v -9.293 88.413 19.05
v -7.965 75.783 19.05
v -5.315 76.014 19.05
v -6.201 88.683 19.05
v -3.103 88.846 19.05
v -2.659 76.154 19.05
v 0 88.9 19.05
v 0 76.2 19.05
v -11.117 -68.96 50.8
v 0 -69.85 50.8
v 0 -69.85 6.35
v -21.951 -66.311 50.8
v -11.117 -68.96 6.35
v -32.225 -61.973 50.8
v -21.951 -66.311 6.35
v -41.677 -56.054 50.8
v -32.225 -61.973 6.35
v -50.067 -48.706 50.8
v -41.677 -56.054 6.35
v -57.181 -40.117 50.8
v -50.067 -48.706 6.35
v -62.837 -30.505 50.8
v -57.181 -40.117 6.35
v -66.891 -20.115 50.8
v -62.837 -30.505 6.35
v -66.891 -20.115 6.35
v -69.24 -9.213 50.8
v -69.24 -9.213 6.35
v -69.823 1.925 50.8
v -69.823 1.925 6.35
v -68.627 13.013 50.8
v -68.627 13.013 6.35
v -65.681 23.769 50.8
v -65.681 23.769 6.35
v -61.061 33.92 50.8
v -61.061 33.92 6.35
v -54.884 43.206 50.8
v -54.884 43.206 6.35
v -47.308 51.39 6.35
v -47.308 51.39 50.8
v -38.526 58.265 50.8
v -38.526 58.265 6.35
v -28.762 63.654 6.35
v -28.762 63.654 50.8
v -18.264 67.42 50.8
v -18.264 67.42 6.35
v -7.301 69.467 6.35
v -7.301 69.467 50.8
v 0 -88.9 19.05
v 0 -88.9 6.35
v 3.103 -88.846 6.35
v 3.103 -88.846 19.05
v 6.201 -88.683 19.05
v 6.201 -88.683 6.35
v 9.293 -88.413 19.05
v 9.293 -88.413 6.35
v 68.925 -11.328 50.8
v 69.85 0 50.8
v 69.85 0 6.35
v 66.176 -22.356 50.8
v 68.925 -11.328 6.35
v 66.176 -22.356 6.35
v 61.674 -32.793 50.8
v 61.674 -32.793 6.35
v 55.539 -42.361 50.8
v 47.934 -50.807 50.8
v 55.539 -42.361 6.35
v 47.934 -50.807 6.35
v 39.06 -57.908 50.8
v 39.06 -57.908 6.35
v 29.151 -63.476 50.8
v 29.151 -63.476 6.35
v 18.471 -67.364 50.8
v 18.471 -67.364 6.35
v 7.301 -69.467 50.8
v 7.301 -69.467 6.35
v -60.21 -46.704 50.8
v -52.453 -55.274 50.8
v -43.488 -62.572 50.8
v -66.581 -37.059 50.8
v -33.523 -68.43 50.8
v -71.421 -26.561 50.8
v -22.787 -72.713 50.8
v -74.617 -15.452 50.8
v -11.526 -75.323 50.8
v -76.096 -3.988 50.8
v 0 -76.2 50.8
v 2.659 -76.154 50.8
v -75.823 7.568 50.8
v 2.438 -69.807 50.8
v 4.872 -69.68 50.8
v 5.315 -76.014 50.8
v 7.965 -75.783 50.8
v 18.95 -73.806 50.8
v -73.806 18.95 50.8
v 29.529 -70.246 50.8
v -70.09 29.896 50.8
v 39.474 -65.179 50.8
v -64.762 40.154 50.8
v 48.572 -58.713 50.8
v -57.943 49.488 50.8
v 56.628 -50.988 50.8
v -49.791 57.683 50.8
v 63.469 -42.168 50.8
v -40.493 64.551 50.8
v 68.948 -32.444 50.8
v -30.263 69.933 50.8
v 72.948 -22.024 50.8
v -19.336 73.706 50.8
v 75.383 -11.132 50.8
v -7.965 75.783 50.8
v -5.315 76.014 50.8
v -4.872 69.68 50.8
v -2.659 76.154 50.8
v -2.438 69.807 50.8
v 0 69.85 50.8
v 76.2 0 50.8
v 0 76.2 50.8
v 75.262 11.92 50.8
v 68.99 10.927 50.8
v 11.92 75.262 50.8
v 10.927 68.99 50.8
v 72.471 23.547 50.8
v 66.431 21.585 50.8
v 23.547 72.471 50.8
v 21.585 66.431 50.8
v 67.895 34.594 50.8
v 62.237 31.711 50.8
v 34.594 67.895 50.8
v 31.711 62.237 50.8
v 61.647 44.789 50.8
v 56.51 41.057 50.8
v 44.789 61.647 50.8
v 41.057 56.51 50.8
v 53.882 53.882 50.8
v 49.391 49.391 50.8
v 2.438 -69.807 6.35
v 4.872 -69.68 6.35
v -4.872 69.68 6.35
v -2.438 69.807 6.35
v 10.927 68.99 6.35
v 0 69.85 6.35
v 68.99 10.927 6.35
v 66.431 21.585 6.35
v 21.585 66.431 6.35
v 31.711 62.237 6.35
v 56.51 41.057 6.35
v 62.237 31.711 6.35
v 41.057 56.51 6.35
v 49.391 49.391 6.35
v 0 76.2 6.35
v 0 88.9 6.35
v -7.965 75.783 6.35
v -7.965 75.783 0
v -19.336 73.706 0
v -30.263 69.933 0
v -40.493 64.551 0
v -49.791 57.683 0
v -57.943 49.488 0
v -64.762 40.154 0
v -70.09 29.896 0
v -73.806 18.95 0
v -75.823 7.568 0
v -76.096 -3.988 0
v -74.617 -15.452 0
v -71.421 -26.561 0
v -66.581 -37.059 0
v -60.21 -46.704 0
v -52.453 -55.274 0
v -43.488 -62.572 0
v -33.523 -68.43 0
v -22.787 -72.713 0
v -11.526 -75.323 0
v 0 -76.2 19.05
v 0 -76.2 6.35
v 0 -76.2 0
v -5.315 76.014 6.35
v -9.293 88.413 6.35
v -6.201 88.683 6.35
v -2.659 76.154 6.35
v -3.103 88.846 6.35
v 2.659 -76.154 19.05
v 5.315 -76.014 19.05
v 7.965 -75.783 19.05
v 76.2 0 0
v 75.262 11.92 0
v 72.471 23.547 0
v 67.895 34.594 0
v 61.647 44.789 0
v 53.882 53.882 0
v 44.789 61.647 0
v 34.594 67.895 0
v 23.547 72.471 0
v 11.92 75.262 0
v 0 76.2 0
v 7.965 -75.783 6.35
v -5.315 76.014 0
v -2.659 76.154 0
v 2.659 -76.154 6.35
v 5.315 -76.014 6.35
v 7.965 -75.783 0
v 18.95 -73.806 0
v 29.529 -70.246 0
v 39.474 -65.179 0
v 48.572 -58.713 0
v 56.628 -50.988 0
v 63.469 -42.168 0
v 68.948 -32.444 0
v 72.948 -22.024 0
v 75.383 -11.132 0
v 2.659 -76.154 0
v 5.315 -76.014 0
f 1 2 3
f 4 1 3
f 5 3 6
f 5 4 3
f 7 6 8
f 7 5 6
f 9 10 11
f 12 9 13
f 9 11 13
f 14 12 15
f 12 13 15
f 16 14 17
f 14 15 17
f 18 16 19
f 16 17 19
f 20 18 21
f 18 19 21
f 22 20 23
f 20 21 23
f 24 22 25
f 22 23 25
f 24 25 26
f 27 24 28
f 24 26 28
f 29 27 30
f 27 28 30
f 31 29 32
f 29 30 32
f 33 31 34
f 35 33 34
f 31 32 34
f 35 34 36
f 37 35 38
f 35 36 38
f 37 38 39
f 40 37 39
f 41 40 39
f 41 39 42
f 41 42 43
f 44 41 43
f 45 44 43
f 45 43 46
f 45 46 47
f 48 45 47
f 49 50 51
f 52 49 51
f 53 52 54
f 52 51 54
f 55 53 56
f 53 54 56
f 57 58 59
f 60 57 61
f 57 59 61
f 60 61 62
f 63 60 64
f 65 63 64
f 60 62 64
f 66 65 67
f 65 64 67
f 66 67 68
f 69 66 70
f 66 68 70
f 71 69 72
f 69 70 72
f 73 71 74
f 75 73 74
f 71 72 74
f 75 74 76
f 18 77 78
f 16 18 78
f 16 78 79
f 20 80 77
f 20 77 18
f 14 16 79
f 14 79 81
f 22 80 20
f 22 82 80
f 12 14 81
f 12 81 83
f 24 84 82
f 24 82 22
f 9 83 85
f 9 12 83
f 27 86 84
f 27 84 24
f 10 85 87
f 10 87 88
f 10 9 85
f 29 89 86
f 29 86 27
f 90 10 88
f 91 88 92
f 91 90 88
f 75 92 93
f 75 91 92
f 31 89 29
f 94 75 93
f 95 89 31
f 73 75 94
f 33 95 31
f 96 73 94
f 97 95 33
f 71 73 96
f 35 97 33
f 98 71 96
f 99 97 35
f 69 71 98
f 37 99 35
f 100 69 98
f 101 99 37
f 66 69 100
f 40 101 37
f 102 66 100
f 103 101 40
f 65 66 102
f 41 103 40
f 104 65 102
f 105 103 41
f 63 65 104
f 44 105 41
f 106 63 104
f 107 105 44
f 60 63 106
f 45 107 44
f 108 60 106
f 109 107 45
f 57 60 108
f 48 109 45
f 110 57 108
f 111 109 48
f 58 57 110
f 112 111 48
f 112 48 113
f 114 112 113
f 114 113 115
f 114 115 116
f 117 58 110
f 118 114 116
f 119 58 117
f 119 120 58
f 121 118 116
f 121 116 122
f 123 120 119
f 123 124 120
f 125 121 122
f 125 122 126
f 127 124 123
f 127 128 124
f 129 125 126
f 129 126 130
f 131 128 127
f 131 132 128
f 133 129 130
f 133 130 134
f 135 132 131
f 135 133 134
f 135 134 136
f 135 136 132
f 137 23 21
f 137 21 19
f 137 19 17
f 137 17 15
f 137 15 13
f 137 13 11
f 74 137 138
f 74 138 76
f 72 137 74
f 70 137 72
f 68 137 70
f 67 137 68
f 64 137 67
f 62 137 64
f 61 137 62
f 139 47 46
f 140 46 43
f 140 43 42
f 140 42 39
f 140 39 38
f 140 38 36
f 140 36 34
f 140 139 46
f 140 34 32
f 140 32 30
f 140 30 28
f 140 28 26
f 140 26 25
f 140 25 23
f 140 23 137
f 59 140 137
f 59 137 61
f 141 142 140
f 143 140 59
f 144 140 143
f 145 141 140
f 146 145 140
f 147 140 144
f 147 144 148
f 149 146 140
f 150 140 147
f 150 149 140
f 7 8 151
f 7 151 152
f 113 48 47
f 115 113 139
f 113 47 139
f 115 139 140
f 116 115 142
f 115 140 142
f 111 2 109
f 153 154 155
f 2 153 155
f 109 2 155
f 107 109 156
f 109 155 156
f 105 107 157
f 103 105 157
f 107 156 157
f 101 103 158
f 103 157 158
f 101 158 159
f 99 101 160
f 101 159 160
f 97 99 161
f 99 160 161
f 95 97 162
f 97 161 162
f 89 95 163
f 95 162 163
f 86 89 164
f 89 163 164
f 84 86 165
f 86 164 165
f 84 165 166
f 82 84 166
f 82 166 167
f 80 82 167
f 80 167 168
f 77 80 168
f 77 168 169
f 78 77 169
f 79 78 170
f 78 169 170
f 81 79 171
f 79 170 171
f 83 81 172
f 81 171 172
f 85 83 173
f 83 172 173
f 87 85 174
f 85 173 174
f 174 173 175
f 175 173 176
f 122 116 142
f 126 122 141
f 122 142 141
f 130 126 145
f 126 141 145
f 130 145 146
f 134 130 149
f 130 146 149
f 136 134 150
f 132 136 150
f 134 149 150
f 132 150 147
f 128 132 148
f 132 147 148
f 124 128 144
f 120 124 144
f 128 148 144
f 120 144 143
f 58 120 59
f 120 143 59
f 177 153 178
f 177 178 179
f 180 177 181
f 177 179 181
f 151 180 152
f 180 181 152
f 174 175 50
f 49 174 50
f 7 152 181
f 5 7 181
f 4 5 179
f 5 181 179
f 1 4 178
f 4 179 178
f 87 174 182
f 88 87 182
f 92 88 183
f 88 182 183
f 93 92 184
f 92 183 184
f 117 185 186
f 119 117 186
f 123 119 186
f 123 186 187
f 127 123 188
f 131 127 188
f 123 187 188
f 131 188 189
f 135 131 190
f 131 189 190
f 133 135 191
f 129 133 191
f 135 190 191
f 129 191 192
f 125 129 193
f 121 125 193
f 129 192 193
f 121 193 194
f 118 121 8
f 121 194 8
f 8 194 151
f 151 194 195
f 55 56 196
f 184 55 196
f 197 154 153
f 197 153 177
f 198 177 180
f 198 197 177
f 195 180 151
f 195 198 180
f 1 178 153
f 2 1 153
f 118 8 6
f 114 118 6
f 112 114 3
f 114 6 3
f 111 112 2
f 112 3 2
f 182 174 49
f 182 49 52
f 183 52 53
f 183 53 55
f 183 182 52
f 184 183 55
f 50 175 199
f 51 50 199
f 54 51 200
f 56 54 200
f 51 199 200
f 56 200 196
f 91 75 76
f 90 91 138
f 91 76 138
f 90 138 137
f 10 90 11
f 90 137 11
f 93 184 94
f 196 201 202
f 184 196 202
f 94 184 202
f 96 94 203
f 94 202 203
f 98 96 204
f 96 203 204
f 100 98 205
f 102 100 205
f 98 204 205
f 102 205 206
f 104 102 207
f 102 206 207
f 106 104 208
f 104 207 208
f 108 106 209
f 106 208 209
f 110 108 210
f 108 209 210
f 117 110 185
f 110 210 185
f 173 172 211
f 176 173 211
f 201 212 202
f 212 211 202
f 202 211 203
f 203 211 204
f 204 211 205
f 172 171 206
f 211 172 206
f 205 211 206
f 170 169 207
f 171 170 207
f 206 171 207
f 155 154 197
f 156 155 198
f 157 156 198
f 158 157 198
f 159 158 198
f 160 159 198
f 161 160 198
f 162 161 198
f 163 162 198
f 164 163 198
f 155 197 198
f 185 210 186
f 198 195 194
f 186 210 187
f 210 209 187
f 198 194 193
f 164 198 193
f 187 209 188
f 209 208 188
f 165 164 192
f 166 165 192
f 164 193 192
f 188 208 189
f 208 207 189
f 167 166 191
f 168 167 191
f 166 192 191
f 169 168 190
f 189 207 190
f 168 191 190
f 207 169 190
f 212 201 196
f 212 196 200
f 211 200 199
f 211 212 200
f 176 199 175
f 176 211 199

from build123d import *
from build123d import SkipClean  # not in build123d's __all__

# Parameters (mm, degrees)
F1_DEPTH = 50.8
F2_DEPTH = 19.05
F3_DEPTH = 6.35
F4_DEPTH = 6.35


# Not quite as in the source:
# - after a boolean that leaves OpenCascade's solid faulty, fix() repairs it


with BuildPart() as f1:
    # F0 (on Top) → F1 (new body)
    with BuildSketch(Plane.XY):
        with BuildLine():
            Line((-7.3013131592, 69.4673543915), (-7.965068901, 75.7825684271))
            ThreePointArc((-7.965068901, 75.7825684271), (-76.0955705483, -3.9879998657), (0, -76.2))
            Line((0, -76.2), (0, -69.85))
            ThreePointArc((0, -69.85), (-69.7542730026, -3.6556665436), (-7.3013131592, 69.4673543915))
        make_face()
        with BuildLine():
            Line((0, 69.85), (0, 76.2))
            ThreePointArc((0, 76.2), (-3.9879998657, 76.0955705483), (-7.965068901, 75.7825684271))
            Line((-7.965068901, 75.7825684271), (-7.3013131592, 69.4673543915))
            ThreePointArc((-7.3013131592, 69.4673543915), (-3.6556665436, 69.7542730026), (0, 69.85))
        make_face()
        with BuildLine():
            ThreePointArc((0, -76.2), (3.9879998657, -76.0955705483), (7.965068901, -75.7825684271))
            Line((7.965068901, -75.7825684271), (7.3013131592, -69.4673543915))
            ThreePointArc((7.3013131592, -69.4673543915), (3.6556665436, -69.7542730026), (0, -69.85))
            Line((0, -69.85), (0, -76.2))
        make_face()
        with BuildLine():
            ThreePointArc((7.965068901, -75.7825684271), (56.6276357014, -50.9877522045), (76.2, 0))
            ThreePointArc((76.2, 0), (53.8815367264, 53.8815367264), (0, 76.2))
            Line((0, 76.2), (0, 69.85))
            ThreePointArc((0, 69.85), (49.3914086659, 49.3914086659), (69.85, 0))
            ThreePointArc((69.85, 0), (51.9086660596, -46.7387728542), (7.3013131592, -69.4673543915))
            Line((7.3013131592, -69.4673543915), (7.965068901, -75.7825684271))
        make_face()
    extrude(amount=F1_DEPTH)

    # F0 (on Top) → F2 (join)
    with BuildSketch(Plane.XY):
        with BuildLine():
            ThreePointArc((-7.965068901, 75.7825684271), (-3.9879998657, 76.0955705483), (0, 76.2))
            Line((0, 76.2), (0, 88.9))
            ThreePointArc((0, 88.9), (-4.65266651, 88.7781656397), (-9.2925803845, 88.4129964982))
            Line((-9.2925803845, 88.4129964982), (-7.965068901, 75.7825684271))
        make_face()
        with BuildLine():
            Line((9.2925803845, -88.4129964982), (7.965068901, -75.7825684271))
            ThreePointArc((7.965068901, -75.7825684271), (3.9879998657, -76.0955705483), (0, -76.2))
            Line((0, -76.2), (0, -88.9))
            ThreePointArc((0, -88.9), (4.65266651, -88.7781656397), (9.2925803845, -88.4129964982))
        make_face()
    extrude(amount=F2_DEPTH)

    # F0 (on Top) → F3 (cut)
    with BuildSketch(Plane.XY):
        with BuildLine():
            Line((9.2925803845, -88.4129964982), (7.965068901, -75.7825684271))
            ThreePointArc((7.965068901, -75.7825684271), (3.9879998657, -76.0955705483), (0, -76.2))
            Line((0, -76.2), (0, -88.9))
            ThreePointArc((0, -88.9), (4.65266651, -88.7781656397), (9.2925803845, -88.4129964982))
        make_face()
        with BuildLine():
            ThreePointArc((-7.965068901, 75.7825684271), (-3.9879998657, 76.0955705483), (0, 76.2))
            Line((0, 76.2), (0, 88.9))
            ThreePointArc((0, 88.9), (-4.65266651, 88.7781656397), (-9.2925803845, 88.4129964982))
            Line((-9.2925803845, 88.4129964982), (-7.965068901, 75.7825684271))
        make_face()
    with SkipClean():  # cleaning this boolean's faces spoils the solid; the shape is the same uncleaned
        extrude(amount=F3_DEPTH, mode=Mode.SUBTRACT)

    # F0 (on Top) → F4 (join)
    with BuildSketch(Plane.XY):
        with BuildLine():
            Line((0, 0), (-7.3013131592, 69.4673543915))
            ThreePointArc((-7.3013131592, 69.4673543915), (-69.7542730026, -3.6556665436), (0, -69.85))
            Line((0, -69.85), (0, 0))
        make_face()
        with BuildLine():
            Line((0, 0), (0, 69.85))
            ThreePointArc((0, 69.85), (-3.6556665436, 69.7542730026), (-7.3013131592, 69.4673543915))
            Line((-7.3013131592, 69.4673543915), (0, 0))
        make_face()
        with BuildLine():
            ThreePointArc((69.85, 0), (49.3914086659, 49.3914086659), (0, 69.85))
            Line((0, 69.85), (0, 0))
            Line((0, 0), (7.3013131592, -69.4673543915))
            ThreePointArc((7.3013131592, -69.4673543915), (51.9086660596, -46.7387728542), (69.85, 0))
        make_face()
        with BuildLine():
            ThreePointArc((0, -69.85), (3.6556665436, -69.7542730026), (7.3013131592, -69.4673543915))
            Line((7.3013131592, -69.4673543915), (0, 0))
            Line((0, 0), (0, -69.85))
        make_face()
    extrude(amount=F4_DEPTH)

    add(f1.part.fix(), mode=Mode.REPLACE)


solid = f1.part
